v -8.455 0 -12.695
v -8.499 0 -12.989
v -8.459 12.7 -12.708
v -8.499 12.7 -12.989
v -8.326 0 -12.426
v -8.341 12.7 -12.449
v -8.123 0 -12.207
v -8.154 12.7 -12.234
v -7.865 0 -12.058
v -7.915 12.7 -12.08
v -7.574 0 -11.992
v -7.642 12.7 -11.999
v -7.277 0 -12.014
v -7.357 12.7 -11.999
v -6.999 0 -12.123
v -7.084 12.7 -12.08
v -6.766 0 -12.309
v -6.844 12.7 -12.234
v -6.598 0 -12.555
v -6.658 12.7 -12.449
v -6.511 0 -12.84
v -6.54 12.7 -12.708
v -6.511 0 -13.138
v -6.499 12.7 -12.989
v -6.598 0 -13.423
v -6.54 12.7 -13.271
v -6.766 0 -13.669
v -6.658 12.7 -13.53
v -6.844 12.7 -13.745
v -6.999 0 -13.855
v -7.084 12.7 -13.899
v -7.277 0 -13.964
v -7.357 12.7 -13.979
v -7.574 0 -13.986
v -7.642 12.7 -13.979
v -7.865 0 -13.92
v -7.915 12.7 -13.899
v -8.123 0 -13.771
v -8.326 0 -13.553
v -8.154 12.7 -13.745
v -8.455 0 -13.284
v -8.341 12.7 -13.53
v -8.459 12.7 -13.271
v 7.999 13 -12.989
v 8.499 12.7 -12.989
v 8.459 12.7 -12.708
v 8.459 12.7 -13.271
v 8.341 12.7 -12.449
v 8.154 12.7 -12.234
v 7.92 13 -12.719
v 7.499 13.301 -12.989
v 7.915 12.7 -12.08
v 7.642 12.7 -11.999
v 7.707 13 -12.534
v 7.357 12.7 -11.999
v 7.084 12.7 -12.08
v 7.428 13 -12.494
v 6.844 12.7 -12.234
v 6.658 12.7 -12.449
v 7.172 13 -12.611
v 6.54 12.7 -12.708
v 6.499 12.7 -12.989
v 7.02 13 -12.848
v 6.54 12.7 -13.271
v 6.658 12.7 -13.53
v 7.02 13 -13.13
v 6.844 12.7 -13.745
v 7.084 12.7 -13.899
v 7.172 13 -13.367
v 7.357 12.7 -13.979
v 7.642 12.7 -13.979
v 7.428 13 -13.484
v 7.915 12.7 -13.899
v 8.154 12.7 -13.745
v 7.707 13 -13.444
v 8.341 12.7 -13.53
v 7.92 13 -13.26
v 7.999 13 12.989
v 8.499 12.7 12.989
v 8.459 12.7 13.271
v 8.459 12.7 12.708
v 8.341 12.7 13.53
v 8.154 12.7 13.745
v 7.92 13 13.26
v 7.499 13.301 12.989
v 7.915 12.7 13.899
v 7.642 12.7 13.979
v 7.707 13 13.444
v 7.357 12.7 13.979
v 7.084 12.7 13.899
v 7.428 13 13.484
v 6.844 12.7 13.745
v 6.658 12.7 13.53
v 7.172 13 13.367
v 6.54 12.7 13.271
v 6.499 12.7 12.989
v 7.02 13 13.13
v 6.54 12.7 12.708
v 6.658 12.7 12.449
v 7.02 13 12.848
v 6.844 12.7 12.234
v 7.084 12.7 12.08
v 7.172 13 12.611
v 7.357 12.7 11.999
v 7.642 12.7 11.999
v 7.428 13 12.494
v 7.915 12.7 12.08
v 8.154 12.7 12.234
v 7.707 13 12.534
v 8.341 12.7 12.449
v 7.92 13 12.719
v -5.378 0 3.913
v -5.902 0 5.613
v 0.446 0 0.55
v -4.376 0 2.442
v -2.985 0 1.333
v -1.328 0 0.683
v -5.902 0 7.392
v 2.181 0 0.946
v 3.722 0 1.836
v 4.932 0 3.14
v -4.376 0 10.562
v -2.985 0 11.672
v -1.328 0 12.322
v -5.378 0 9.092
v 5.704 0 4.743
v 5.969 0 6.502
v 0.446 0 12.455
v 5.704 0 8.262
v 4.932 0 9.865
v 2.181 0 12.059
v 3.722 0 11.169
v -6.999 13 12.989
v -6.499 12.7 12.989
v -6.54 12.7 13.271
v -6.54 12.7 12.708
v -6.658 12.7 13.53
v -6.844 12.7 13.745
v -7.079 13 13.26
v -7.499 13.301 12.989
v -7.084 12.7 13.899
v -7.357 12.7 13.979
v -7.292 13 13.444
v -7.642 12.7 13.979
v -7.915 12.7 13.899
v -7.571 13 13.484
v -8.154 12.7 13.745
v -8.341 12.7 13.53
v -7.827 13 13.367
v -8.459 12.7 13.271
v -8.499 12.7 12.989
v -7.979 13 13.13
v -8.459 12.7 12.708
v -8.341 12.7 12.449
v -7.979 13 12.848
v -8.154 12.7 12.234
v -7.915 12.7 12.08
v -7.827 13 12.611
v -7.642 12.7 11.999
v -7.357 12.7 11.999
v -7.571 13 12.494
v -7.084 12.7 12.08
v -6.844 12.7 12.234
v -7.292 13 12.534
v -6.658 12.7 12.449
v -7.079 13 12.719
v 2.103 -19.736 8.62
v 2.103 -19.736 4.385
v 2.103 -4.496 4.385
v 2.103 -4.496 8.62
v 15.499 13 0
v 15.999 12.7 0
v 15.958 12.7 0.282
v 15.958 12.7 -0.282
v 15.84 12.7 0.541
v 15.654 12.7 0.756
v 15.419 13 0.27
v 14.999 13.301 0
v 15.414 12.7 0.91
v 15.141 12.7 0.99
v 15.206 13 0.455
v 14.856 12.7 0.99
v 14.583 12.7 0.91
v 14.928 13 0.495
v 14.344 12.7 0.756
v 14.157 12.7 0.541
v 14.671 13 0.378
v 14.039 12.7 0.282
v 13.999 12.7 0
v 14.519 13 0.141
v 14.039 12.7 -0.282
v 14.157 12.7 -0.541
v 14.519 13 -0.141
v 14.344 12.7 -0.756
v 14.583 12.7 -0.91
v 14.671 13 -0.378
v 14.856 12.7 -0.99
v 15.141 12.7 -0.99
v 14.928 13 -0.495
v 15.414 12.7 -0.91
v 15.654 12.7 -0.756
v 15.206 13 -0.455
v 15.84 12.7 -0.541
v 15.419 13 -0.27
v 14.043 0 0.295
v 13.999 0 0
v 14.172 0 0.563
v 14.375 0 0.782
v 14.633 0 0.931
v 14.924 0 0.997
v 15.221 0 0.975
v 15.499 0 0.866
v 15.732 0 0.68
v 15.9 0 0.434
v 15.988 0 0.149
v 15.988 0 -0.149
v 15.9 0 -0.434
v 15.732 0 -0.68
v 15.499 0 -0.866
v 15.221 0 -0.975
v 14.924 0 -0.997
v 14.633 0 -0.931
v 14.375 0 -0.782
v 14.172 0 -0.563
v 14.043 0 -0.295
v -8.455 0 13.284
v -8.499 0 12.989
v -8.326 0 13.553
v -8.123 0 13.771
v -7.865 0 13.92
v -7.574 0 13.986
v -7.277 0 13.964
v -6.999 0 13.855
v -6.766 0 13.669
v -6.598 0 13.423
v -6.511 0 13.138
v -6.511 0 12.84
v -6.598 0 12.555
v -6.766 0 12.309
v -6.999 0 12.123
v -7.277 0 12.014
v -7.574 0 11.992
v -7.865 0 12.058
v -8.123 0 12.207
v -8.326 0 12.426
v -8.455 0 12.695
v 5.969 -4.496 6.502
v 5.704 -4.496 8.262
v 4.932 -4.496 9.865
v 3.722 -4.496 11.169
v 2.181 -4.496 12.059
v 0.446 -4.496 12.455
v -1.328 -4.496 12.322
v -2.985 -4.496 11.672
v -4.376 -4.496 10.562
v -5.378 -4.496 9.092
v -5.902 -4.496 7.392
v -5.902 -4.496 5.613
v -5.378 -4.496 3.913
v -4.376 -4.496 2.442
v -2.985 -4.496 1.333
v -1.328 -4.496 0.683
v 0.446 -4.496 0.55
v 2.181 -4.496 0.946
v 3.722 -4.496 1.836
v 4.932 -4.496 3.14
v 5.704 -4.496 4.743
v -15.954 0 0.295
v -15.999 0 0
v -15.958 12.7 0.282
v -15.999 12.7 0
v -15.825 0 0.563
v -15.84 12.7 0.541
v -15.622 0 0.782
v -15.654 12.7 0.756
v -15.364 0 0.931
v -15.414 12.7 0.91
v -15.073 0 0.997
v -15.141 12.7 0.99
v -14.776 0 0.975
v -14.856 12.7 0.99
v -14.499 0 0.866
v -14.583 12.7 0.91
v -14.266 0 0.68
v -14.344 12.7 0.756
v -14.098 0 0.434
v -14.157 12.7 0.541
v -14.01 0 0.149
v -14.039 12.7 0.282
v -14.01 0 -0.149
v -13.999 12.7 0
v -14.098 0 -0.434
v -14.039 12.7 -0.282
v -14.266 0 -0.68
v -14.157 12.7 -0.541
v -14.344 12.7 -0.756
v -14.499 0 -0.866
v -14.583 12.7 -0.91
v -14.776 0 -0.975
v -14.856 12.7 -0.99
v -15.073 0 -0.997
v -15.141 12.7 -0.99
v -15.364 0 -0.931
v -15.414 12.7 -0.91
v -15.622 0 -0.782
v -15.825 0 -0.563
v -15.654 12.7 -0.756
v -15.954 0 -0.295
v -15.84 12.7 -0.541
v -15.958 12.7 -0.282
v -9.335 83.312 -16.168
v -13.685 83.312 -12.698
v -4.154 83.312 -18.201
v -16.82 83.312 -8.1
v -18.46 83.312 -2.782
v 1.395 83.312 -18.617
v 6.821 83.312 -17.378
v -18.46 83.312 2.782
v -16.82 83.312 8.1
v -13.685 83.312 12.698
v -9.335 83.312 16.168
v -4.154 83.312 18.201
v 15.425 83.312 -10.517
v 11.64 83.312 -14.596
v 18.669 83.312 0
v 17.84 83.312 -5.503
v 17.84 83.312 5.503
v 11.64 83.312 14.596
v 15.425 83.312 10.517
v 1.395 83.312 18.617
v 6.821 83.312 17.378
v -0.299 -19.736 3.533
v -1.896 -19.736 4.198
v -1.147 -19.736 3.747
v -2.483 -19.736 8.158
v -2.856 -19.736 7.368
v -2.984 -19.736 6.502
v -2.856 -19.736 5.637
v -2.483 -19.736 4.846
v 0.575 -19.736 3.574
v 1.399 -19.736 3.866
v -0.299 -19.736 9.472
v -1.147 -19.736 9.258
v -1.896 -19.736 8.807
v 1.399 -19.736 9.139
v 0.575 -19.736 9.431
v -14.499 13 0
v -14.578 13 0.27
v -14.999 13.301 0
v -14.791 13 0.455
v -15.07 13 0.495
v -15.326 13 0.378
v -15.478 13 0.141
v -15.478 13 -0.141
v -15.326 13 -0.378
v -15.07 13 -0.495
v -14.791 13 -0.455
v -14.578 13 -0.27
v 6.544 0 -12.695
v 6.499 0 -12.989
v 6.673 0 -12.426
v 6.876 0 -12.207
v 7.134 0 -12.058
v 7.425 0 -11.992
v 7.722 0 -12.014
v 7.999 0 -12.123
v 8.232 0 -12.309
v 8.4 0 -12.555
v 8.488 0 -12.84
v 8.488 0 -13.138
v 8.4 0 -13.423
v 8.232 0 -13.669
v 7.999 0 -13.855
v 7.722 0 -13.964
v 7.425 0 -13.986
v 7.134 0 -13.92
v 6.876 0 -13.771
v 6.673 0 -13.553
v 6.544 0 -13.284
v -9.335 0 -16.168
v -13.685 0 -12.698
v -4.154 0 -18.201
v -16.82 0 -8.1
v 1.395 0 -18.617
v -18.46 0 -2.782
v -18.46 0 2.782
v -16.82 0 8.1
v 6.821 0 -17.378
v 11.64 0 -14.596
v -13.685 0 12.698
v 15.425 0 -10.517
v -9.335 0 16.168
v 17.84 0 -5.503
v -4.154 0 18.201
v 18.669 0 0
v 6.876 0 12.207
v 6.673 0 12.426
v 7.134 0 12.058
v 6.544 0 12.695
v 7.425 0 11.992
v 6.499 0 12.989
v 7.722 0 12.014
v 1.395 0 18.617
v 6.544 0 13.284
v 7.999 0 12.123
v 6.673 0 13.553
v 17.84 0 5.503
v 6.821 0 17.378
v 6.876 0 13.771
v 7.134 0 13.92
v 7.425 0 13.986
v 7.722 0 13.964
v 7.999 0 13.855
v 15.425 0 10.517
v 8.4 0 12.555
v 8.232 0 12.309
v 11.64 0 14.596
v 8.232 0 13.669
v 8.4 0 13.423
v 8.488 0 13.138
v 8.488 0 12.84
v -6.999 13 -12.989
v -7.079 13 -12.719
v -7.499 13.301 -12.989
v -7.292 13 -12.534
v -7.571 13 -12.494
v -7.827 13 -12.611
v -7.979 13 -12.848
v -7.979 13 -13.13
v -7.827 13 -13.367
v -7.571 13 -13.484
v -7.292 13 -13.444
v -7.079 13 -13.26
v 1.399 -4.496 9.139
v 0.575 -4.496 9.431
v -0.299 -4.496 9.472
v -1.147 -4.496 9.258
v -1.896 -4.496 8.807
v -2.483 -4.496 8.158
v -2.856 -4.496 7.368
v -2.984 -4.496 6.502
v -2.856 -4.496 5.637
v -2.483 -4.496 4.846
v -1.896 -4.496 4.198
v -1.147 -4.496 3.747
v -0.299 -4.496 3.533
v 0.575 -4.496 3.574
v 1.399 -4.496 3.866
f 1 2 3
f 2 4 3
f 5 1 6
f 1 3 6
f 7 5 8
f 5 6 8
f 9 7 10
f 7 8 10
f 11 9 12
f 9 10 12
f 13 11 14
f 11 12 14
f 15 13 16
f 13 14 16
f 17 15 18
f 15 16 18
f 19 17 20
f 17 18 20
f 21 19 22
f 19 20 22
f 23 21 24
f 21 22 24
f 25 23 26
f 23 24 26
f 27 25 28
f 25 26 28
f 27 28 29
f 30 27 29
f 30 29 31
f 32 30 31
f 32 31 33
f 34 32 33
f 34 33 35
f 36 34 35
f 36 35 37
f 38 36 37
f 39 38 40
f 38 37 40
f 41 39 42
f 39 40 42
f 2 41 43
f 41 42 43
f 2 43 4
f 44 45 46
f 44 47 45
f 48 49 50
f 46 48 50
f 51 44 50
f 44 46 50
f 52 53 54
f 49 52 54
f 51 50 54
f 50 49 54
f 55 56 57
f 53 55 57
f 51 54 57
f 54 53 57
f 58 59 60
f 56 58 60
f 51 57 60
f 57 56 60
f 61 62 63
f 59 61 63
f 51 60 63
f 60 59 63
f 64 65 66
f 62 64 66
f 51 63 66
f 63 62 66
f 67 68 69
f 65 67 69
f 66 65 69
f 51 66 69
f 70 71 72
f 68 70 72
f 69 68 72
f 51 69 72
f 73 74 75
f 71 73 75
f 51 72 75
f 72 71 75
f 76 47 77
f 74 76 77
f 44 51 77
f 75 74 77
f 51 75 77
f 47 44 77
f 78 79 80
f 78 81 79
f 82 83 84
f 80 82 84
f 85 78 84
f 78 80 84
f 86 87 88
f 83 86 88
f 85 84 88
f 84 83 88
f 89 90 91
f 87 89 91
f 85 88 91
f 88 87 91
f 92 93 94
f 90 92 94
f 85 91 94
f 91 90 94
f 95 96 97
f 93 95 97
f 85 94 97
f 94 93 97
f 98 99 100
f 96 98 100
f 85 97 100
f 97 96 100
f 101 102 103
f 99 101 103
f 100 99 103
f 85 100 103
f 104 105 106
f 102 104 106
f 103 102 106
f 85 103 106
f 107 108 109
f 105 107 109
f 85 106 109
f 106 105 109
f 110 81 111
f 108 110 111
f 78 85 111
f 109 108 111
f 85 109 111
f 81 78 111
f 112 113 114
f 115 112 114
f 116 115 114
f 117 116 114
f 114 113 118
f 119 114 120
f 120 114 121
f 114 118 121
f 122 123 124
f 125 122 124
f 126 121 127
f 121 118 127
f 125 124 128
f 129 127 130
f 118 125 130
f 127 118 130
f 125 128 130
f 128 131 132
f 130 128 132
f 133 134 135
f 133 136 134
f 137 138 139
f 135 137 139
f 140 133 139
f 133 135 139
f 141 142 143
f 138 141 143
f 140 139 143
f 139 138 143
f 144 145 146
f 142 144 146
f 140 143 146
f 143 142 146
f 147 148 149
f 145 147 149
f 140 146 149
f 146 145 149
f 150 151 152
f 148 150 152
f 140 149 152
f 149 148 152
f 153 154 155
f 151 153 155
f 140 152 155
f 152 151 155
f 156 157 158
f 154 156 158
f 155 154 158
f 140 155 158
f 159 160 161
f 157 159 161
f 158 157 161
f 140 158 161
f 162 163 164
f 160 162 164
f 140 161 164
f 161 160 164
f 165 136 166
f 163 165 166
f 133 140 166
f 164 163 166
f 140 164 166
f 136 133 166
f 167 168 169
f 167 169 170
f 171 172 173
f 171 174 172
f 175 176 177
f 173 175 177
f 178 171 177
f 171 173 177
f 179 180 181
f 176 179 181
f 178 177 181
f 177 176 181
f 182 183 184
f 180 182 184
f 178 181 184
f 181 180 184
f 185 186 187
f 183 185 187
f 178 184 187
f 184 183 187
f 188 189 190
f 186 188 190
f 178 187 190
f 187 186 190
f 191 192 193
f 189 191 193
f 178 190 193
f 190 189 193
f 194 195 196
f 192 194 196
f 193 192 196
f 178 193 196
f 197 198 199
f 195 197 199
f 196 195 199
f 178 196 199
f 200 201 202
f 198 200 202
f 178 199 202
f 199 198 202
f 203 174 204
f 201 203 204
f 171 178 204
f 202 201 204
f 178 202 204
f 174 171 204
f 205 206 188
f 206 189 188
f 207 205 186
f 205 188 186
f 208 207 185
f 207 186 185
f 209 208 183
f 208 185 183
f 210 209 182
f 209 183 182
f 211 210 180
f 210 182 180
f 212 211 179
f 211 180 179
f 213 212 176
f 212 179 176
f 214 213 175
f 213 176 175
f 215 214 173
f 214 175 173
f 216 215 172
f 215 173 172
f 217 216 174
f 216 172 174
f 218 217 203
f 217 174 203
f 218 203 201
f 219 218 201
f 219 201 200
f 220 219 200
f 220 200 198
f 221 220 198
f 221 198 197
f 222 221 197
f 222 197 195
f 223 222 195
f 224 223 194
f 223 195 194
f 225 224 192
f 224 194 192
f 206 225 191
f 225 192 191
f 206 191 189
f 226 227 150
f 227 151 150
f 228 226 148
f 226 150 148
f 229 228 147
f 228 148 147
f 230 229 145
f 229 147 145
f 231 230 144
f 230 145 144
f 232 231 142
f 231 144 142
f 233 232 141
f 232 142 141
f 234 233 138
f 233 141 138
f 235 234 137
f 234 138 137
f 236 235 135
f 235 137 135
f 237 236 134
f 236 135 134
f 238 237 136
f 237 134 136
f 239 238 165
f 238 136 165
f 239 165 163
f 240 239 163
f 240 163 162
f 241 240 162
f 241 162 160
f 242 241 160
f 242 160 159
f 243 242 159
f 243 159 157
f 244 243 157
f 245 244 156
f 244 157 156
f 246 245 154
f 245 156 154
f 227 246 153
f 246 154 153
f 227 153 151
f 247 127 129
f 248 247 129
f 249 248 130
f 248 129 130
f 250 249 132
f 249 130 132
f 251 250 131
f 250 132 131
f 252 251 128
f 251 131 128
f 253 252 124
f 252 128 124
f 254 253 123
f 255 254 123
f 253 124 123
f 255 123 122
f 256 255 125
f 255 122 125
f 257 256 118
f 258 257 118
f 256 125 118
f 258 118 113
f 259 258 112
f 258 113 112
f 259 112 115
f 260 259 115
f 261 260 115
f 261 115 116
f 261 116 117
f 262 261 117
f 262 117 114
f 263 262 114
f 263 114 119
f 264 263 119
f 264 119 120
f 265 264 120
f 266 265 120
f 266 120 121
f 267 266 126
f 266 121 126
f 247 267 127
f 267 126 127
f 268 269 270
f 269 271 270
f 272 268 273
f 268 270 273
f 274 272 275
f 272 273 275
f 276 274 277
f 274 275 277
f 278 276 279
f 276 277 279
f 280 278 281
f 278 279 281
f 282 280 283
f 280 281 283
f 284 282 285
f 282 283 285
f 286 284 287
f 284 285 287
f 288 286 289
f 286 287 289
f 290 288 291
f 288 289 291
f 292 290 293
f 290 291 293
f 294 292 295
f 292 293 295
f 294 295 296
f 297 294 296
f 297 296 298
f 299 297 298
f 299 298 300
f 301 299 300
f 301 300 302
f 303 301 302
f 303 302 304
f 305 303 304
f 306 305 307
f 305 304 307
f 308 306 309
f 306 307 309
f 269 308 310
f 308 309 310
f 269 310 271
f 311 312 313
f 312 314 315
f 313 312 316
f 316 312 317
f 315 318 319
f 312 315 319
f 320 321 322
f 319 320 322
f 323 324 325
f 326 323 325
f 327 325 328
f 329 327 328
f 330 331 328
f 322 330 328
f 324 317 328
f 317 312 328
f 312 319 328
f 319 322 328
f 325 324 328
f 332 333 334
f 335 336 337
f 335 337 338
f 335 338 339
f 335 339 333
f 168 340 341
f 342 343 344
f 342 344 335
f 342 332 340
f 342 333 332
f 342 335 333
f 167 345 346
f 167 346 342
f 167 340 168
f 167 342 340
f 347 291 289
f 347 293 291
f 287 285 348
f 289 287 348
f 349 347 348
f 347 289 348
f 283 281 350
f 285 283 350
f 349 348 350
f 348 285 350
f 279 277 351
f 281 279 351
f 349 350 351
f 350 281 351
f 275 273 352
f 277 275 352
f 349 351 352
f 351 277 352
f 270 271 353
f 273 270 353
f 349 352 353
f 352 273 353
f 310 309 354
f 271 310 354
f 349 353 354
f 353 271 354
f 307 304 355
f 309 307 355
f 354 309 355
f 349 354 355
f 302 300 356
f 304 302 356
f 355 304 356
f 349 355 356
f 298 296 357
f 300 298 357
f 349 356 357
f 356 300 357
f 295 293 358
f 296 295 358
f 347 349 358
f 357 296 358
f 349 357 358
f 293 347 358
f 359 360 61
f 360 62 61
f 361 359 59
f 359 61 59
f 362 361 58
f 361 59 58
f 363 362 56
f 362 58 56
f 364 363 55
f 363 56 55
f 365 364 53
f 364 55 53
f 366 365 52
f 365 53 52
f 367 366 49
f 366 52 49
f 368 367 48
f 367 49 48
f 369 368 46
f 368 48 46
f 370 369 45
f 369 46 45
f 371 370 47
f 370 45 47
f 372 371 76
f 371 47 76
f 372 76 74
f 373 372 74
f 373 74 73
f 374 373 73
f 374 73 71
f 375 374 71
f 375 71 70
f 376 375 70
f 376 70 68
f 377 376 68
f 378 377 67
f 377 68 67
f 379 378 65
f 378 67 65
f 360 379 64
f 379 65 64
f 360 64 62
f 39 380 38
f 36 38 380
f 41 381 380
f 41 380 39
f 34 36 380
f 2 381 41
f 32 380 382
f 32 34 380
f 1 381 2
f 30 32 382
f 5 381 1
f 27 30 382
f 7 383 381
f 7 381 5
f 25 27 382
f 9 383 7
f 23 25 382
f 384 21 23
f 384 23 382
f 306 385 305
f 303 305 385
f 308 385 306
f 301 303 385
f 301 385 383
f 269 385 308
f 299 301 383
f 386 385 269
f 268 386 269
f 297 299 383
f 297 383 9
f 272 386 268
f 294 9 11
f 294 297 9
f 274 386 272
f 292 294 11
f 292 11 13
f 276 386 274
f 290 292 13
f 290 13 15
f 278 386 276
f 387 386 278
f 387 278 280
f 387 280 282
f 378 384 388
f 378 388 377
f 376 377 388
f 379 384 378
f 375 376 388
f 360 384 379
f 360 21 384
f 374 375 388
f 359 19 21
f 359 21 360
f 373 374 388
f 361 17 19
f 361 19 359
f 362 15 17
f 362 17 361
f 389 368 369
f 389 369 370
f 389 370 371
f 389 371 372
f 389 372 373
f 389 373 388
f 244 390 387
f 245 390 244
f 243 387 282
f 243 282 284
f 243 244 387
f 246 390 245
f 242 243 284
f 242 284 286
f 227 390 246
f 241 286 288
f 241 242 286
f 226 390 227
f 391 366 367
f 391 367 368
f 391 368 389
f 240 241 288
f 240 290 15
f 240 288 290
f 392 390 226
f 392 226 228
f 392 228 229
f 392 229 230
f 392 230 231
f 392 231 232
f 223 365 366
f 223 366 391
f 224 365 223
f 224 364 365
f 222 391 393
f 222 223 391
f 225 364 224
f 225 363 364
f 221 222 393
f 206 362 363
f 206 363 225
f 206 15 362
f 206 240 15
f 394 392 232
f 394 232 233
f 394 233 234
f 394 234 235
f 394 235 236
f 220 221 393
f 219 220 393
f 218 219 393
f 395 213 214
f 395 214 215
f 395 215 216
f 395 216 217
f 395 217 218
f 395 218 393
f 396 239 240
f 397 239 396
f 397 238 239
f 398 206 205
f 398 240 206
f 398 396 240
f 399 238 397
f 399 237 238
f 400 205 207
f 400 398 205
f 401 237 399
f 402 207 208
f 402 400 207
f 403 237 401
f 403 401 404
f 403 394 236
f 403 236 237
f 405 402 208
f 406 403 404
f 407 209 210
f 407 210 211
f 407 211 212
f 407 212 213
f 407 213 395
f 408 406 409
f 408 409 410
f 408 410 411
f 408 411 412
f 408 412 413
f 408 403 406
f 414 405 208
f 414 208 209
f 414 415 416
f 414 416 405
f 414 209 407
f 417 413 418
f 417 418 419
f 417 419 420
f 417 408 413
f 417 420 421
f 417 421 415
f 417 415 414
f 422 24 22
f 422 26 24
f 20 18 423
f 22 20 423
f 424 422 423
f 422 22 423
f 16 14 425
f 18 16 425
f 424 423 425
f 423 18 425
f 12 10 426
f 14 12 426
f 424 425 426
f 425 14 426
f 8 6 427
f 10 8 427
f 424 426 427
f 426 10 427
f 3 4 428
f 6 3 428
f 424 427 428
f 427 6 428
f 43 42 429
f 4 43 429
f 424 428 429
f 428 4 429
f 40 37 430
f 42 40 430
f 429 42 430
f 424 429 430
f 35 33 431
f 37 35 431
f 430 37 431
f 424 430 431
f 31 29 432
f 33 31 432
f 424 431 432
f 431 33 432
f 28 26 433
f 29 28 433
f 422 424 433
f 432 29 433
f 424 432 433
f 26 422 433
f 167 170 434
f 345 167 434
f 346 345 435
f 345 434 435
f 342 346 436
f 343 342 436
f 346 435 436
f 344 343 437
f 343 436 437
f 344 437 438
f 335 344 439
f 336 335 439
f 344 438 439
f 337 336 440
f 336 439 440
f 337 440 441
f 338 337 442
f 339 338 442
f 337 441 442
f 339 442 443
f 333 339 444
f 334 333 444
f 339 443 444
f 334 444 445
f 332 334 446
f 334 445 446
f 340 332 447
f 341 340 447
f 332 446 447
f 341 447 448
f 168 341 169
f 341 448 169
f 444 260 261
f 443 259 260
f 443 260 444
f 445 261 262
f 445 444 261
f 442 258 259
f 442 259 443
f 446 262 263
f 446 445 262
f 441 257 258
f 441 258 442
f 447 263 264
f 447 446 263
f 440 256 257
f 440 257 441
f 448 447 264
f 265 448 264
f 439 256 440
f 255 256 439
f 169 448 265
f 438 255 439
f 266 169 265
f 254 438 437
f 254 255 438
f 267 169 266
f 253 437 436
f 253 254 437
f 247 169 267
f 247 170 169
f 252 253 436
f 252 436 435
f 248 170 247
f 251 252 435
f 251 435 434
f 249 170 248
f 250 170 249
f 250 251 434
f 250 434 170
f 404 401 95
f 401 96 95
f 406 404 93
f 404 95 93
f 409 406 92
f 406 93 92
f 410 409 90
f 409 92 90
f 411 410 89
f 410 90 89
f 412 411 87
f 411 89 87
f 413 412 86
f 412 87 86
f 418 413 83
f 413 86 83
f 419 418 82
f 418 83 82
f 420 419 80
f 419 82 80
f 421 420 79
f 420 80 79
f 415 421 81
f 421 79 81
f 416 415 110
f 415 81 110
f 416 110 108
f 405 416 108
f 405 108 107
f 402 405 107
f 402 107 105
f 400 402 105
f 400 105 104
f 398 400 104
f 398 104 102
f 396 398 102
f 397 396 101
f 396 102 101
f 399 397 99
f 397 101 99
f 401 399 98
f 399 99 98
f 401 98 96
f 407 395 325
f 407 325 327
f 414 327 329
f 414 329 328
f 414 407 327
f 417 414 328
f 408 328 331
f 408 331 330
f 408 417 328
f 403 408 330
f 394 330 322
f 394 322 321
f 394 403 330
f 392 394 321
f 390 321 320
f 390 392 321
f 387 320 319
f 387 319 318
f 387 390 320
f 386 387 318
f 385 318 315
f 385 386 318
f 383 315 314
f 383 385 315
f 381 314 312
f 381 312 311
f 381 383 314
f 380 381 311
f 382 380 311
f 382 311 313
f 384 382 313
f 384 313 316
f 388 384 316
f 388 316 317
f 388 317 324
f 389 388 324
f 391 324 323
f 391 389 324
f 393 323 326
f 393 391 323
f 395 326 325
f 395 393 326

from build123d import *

# Parameters (mm, degrees)
F0_R     = 18.669
F0_R_2   = 14.9987
F0_R_3   = 5.969
F1_DEPTH = 83.312
F2_D     = 2
F2_DEPTH = 12.7
F2_TIP   = 0.600860619
F3_DEPTH = 4.4958
F5_DEPTH = 15.24


with BuildPart() as f1:
    # F0 (on Front) → F1 (new body)
    with BuildSketch(Plane.XZ):
        Circle(F0_R)
        Circle(F0_R_2, mode=Mode.SUBTRACT)
        Circle(F0_R_2)
        with Locations((0, 6.5024)):
            Circle(F0_R_3, mode=Mode.SUBTRACT)
        with Locations((0, 6.5024)):
            Circle(F0_R_3)
    extrude(amount=-F1_DEPTH)

    # F2
    with Locations(Plane.XZ):
        with Locations((-7.49935, 12.9892552237), (7.49935, 12.9892552237), (14.9987, 0), (7.49935, -12.9892552237), (-7.49935, -12.9892552237), (-14.9987, 0)):
            Hole(F2_D / 2, depth=F2_DEPTH)
            with Locations((0, 0, -(F2_DEPTH + F2_TIP / 2))):  # 118° drill point
                Cone(0, F2_D / 2, F2_TIP, mode=Mode.SUBTRACT)


with BuildPart() as f3:
    # F0 (on Front) → F3 (new body)
    with BuildSketch(Plane.XZ):
        with Locations((0, 6.5024)):
            Circle(F0_R_3)
    extrude(amount=F3_DEPTH)

    # F4 (on face) → F5 (join)
    with BuildSketch(Plane.XZ.offset(4.4958)):
        with BuildLine():
            Line((2.1031773316, 4.3848813196), (2.1031773316, 8.6199186804))
            ThreePointArc((2.1031773316, 8.6199186804), (-2.9845, 6.5024), (2.1031773316, 4.3848813196))
        make_face()
    extrude(amount=F5_DEPTH)


solid = Compound([f1.part, f3.part])
